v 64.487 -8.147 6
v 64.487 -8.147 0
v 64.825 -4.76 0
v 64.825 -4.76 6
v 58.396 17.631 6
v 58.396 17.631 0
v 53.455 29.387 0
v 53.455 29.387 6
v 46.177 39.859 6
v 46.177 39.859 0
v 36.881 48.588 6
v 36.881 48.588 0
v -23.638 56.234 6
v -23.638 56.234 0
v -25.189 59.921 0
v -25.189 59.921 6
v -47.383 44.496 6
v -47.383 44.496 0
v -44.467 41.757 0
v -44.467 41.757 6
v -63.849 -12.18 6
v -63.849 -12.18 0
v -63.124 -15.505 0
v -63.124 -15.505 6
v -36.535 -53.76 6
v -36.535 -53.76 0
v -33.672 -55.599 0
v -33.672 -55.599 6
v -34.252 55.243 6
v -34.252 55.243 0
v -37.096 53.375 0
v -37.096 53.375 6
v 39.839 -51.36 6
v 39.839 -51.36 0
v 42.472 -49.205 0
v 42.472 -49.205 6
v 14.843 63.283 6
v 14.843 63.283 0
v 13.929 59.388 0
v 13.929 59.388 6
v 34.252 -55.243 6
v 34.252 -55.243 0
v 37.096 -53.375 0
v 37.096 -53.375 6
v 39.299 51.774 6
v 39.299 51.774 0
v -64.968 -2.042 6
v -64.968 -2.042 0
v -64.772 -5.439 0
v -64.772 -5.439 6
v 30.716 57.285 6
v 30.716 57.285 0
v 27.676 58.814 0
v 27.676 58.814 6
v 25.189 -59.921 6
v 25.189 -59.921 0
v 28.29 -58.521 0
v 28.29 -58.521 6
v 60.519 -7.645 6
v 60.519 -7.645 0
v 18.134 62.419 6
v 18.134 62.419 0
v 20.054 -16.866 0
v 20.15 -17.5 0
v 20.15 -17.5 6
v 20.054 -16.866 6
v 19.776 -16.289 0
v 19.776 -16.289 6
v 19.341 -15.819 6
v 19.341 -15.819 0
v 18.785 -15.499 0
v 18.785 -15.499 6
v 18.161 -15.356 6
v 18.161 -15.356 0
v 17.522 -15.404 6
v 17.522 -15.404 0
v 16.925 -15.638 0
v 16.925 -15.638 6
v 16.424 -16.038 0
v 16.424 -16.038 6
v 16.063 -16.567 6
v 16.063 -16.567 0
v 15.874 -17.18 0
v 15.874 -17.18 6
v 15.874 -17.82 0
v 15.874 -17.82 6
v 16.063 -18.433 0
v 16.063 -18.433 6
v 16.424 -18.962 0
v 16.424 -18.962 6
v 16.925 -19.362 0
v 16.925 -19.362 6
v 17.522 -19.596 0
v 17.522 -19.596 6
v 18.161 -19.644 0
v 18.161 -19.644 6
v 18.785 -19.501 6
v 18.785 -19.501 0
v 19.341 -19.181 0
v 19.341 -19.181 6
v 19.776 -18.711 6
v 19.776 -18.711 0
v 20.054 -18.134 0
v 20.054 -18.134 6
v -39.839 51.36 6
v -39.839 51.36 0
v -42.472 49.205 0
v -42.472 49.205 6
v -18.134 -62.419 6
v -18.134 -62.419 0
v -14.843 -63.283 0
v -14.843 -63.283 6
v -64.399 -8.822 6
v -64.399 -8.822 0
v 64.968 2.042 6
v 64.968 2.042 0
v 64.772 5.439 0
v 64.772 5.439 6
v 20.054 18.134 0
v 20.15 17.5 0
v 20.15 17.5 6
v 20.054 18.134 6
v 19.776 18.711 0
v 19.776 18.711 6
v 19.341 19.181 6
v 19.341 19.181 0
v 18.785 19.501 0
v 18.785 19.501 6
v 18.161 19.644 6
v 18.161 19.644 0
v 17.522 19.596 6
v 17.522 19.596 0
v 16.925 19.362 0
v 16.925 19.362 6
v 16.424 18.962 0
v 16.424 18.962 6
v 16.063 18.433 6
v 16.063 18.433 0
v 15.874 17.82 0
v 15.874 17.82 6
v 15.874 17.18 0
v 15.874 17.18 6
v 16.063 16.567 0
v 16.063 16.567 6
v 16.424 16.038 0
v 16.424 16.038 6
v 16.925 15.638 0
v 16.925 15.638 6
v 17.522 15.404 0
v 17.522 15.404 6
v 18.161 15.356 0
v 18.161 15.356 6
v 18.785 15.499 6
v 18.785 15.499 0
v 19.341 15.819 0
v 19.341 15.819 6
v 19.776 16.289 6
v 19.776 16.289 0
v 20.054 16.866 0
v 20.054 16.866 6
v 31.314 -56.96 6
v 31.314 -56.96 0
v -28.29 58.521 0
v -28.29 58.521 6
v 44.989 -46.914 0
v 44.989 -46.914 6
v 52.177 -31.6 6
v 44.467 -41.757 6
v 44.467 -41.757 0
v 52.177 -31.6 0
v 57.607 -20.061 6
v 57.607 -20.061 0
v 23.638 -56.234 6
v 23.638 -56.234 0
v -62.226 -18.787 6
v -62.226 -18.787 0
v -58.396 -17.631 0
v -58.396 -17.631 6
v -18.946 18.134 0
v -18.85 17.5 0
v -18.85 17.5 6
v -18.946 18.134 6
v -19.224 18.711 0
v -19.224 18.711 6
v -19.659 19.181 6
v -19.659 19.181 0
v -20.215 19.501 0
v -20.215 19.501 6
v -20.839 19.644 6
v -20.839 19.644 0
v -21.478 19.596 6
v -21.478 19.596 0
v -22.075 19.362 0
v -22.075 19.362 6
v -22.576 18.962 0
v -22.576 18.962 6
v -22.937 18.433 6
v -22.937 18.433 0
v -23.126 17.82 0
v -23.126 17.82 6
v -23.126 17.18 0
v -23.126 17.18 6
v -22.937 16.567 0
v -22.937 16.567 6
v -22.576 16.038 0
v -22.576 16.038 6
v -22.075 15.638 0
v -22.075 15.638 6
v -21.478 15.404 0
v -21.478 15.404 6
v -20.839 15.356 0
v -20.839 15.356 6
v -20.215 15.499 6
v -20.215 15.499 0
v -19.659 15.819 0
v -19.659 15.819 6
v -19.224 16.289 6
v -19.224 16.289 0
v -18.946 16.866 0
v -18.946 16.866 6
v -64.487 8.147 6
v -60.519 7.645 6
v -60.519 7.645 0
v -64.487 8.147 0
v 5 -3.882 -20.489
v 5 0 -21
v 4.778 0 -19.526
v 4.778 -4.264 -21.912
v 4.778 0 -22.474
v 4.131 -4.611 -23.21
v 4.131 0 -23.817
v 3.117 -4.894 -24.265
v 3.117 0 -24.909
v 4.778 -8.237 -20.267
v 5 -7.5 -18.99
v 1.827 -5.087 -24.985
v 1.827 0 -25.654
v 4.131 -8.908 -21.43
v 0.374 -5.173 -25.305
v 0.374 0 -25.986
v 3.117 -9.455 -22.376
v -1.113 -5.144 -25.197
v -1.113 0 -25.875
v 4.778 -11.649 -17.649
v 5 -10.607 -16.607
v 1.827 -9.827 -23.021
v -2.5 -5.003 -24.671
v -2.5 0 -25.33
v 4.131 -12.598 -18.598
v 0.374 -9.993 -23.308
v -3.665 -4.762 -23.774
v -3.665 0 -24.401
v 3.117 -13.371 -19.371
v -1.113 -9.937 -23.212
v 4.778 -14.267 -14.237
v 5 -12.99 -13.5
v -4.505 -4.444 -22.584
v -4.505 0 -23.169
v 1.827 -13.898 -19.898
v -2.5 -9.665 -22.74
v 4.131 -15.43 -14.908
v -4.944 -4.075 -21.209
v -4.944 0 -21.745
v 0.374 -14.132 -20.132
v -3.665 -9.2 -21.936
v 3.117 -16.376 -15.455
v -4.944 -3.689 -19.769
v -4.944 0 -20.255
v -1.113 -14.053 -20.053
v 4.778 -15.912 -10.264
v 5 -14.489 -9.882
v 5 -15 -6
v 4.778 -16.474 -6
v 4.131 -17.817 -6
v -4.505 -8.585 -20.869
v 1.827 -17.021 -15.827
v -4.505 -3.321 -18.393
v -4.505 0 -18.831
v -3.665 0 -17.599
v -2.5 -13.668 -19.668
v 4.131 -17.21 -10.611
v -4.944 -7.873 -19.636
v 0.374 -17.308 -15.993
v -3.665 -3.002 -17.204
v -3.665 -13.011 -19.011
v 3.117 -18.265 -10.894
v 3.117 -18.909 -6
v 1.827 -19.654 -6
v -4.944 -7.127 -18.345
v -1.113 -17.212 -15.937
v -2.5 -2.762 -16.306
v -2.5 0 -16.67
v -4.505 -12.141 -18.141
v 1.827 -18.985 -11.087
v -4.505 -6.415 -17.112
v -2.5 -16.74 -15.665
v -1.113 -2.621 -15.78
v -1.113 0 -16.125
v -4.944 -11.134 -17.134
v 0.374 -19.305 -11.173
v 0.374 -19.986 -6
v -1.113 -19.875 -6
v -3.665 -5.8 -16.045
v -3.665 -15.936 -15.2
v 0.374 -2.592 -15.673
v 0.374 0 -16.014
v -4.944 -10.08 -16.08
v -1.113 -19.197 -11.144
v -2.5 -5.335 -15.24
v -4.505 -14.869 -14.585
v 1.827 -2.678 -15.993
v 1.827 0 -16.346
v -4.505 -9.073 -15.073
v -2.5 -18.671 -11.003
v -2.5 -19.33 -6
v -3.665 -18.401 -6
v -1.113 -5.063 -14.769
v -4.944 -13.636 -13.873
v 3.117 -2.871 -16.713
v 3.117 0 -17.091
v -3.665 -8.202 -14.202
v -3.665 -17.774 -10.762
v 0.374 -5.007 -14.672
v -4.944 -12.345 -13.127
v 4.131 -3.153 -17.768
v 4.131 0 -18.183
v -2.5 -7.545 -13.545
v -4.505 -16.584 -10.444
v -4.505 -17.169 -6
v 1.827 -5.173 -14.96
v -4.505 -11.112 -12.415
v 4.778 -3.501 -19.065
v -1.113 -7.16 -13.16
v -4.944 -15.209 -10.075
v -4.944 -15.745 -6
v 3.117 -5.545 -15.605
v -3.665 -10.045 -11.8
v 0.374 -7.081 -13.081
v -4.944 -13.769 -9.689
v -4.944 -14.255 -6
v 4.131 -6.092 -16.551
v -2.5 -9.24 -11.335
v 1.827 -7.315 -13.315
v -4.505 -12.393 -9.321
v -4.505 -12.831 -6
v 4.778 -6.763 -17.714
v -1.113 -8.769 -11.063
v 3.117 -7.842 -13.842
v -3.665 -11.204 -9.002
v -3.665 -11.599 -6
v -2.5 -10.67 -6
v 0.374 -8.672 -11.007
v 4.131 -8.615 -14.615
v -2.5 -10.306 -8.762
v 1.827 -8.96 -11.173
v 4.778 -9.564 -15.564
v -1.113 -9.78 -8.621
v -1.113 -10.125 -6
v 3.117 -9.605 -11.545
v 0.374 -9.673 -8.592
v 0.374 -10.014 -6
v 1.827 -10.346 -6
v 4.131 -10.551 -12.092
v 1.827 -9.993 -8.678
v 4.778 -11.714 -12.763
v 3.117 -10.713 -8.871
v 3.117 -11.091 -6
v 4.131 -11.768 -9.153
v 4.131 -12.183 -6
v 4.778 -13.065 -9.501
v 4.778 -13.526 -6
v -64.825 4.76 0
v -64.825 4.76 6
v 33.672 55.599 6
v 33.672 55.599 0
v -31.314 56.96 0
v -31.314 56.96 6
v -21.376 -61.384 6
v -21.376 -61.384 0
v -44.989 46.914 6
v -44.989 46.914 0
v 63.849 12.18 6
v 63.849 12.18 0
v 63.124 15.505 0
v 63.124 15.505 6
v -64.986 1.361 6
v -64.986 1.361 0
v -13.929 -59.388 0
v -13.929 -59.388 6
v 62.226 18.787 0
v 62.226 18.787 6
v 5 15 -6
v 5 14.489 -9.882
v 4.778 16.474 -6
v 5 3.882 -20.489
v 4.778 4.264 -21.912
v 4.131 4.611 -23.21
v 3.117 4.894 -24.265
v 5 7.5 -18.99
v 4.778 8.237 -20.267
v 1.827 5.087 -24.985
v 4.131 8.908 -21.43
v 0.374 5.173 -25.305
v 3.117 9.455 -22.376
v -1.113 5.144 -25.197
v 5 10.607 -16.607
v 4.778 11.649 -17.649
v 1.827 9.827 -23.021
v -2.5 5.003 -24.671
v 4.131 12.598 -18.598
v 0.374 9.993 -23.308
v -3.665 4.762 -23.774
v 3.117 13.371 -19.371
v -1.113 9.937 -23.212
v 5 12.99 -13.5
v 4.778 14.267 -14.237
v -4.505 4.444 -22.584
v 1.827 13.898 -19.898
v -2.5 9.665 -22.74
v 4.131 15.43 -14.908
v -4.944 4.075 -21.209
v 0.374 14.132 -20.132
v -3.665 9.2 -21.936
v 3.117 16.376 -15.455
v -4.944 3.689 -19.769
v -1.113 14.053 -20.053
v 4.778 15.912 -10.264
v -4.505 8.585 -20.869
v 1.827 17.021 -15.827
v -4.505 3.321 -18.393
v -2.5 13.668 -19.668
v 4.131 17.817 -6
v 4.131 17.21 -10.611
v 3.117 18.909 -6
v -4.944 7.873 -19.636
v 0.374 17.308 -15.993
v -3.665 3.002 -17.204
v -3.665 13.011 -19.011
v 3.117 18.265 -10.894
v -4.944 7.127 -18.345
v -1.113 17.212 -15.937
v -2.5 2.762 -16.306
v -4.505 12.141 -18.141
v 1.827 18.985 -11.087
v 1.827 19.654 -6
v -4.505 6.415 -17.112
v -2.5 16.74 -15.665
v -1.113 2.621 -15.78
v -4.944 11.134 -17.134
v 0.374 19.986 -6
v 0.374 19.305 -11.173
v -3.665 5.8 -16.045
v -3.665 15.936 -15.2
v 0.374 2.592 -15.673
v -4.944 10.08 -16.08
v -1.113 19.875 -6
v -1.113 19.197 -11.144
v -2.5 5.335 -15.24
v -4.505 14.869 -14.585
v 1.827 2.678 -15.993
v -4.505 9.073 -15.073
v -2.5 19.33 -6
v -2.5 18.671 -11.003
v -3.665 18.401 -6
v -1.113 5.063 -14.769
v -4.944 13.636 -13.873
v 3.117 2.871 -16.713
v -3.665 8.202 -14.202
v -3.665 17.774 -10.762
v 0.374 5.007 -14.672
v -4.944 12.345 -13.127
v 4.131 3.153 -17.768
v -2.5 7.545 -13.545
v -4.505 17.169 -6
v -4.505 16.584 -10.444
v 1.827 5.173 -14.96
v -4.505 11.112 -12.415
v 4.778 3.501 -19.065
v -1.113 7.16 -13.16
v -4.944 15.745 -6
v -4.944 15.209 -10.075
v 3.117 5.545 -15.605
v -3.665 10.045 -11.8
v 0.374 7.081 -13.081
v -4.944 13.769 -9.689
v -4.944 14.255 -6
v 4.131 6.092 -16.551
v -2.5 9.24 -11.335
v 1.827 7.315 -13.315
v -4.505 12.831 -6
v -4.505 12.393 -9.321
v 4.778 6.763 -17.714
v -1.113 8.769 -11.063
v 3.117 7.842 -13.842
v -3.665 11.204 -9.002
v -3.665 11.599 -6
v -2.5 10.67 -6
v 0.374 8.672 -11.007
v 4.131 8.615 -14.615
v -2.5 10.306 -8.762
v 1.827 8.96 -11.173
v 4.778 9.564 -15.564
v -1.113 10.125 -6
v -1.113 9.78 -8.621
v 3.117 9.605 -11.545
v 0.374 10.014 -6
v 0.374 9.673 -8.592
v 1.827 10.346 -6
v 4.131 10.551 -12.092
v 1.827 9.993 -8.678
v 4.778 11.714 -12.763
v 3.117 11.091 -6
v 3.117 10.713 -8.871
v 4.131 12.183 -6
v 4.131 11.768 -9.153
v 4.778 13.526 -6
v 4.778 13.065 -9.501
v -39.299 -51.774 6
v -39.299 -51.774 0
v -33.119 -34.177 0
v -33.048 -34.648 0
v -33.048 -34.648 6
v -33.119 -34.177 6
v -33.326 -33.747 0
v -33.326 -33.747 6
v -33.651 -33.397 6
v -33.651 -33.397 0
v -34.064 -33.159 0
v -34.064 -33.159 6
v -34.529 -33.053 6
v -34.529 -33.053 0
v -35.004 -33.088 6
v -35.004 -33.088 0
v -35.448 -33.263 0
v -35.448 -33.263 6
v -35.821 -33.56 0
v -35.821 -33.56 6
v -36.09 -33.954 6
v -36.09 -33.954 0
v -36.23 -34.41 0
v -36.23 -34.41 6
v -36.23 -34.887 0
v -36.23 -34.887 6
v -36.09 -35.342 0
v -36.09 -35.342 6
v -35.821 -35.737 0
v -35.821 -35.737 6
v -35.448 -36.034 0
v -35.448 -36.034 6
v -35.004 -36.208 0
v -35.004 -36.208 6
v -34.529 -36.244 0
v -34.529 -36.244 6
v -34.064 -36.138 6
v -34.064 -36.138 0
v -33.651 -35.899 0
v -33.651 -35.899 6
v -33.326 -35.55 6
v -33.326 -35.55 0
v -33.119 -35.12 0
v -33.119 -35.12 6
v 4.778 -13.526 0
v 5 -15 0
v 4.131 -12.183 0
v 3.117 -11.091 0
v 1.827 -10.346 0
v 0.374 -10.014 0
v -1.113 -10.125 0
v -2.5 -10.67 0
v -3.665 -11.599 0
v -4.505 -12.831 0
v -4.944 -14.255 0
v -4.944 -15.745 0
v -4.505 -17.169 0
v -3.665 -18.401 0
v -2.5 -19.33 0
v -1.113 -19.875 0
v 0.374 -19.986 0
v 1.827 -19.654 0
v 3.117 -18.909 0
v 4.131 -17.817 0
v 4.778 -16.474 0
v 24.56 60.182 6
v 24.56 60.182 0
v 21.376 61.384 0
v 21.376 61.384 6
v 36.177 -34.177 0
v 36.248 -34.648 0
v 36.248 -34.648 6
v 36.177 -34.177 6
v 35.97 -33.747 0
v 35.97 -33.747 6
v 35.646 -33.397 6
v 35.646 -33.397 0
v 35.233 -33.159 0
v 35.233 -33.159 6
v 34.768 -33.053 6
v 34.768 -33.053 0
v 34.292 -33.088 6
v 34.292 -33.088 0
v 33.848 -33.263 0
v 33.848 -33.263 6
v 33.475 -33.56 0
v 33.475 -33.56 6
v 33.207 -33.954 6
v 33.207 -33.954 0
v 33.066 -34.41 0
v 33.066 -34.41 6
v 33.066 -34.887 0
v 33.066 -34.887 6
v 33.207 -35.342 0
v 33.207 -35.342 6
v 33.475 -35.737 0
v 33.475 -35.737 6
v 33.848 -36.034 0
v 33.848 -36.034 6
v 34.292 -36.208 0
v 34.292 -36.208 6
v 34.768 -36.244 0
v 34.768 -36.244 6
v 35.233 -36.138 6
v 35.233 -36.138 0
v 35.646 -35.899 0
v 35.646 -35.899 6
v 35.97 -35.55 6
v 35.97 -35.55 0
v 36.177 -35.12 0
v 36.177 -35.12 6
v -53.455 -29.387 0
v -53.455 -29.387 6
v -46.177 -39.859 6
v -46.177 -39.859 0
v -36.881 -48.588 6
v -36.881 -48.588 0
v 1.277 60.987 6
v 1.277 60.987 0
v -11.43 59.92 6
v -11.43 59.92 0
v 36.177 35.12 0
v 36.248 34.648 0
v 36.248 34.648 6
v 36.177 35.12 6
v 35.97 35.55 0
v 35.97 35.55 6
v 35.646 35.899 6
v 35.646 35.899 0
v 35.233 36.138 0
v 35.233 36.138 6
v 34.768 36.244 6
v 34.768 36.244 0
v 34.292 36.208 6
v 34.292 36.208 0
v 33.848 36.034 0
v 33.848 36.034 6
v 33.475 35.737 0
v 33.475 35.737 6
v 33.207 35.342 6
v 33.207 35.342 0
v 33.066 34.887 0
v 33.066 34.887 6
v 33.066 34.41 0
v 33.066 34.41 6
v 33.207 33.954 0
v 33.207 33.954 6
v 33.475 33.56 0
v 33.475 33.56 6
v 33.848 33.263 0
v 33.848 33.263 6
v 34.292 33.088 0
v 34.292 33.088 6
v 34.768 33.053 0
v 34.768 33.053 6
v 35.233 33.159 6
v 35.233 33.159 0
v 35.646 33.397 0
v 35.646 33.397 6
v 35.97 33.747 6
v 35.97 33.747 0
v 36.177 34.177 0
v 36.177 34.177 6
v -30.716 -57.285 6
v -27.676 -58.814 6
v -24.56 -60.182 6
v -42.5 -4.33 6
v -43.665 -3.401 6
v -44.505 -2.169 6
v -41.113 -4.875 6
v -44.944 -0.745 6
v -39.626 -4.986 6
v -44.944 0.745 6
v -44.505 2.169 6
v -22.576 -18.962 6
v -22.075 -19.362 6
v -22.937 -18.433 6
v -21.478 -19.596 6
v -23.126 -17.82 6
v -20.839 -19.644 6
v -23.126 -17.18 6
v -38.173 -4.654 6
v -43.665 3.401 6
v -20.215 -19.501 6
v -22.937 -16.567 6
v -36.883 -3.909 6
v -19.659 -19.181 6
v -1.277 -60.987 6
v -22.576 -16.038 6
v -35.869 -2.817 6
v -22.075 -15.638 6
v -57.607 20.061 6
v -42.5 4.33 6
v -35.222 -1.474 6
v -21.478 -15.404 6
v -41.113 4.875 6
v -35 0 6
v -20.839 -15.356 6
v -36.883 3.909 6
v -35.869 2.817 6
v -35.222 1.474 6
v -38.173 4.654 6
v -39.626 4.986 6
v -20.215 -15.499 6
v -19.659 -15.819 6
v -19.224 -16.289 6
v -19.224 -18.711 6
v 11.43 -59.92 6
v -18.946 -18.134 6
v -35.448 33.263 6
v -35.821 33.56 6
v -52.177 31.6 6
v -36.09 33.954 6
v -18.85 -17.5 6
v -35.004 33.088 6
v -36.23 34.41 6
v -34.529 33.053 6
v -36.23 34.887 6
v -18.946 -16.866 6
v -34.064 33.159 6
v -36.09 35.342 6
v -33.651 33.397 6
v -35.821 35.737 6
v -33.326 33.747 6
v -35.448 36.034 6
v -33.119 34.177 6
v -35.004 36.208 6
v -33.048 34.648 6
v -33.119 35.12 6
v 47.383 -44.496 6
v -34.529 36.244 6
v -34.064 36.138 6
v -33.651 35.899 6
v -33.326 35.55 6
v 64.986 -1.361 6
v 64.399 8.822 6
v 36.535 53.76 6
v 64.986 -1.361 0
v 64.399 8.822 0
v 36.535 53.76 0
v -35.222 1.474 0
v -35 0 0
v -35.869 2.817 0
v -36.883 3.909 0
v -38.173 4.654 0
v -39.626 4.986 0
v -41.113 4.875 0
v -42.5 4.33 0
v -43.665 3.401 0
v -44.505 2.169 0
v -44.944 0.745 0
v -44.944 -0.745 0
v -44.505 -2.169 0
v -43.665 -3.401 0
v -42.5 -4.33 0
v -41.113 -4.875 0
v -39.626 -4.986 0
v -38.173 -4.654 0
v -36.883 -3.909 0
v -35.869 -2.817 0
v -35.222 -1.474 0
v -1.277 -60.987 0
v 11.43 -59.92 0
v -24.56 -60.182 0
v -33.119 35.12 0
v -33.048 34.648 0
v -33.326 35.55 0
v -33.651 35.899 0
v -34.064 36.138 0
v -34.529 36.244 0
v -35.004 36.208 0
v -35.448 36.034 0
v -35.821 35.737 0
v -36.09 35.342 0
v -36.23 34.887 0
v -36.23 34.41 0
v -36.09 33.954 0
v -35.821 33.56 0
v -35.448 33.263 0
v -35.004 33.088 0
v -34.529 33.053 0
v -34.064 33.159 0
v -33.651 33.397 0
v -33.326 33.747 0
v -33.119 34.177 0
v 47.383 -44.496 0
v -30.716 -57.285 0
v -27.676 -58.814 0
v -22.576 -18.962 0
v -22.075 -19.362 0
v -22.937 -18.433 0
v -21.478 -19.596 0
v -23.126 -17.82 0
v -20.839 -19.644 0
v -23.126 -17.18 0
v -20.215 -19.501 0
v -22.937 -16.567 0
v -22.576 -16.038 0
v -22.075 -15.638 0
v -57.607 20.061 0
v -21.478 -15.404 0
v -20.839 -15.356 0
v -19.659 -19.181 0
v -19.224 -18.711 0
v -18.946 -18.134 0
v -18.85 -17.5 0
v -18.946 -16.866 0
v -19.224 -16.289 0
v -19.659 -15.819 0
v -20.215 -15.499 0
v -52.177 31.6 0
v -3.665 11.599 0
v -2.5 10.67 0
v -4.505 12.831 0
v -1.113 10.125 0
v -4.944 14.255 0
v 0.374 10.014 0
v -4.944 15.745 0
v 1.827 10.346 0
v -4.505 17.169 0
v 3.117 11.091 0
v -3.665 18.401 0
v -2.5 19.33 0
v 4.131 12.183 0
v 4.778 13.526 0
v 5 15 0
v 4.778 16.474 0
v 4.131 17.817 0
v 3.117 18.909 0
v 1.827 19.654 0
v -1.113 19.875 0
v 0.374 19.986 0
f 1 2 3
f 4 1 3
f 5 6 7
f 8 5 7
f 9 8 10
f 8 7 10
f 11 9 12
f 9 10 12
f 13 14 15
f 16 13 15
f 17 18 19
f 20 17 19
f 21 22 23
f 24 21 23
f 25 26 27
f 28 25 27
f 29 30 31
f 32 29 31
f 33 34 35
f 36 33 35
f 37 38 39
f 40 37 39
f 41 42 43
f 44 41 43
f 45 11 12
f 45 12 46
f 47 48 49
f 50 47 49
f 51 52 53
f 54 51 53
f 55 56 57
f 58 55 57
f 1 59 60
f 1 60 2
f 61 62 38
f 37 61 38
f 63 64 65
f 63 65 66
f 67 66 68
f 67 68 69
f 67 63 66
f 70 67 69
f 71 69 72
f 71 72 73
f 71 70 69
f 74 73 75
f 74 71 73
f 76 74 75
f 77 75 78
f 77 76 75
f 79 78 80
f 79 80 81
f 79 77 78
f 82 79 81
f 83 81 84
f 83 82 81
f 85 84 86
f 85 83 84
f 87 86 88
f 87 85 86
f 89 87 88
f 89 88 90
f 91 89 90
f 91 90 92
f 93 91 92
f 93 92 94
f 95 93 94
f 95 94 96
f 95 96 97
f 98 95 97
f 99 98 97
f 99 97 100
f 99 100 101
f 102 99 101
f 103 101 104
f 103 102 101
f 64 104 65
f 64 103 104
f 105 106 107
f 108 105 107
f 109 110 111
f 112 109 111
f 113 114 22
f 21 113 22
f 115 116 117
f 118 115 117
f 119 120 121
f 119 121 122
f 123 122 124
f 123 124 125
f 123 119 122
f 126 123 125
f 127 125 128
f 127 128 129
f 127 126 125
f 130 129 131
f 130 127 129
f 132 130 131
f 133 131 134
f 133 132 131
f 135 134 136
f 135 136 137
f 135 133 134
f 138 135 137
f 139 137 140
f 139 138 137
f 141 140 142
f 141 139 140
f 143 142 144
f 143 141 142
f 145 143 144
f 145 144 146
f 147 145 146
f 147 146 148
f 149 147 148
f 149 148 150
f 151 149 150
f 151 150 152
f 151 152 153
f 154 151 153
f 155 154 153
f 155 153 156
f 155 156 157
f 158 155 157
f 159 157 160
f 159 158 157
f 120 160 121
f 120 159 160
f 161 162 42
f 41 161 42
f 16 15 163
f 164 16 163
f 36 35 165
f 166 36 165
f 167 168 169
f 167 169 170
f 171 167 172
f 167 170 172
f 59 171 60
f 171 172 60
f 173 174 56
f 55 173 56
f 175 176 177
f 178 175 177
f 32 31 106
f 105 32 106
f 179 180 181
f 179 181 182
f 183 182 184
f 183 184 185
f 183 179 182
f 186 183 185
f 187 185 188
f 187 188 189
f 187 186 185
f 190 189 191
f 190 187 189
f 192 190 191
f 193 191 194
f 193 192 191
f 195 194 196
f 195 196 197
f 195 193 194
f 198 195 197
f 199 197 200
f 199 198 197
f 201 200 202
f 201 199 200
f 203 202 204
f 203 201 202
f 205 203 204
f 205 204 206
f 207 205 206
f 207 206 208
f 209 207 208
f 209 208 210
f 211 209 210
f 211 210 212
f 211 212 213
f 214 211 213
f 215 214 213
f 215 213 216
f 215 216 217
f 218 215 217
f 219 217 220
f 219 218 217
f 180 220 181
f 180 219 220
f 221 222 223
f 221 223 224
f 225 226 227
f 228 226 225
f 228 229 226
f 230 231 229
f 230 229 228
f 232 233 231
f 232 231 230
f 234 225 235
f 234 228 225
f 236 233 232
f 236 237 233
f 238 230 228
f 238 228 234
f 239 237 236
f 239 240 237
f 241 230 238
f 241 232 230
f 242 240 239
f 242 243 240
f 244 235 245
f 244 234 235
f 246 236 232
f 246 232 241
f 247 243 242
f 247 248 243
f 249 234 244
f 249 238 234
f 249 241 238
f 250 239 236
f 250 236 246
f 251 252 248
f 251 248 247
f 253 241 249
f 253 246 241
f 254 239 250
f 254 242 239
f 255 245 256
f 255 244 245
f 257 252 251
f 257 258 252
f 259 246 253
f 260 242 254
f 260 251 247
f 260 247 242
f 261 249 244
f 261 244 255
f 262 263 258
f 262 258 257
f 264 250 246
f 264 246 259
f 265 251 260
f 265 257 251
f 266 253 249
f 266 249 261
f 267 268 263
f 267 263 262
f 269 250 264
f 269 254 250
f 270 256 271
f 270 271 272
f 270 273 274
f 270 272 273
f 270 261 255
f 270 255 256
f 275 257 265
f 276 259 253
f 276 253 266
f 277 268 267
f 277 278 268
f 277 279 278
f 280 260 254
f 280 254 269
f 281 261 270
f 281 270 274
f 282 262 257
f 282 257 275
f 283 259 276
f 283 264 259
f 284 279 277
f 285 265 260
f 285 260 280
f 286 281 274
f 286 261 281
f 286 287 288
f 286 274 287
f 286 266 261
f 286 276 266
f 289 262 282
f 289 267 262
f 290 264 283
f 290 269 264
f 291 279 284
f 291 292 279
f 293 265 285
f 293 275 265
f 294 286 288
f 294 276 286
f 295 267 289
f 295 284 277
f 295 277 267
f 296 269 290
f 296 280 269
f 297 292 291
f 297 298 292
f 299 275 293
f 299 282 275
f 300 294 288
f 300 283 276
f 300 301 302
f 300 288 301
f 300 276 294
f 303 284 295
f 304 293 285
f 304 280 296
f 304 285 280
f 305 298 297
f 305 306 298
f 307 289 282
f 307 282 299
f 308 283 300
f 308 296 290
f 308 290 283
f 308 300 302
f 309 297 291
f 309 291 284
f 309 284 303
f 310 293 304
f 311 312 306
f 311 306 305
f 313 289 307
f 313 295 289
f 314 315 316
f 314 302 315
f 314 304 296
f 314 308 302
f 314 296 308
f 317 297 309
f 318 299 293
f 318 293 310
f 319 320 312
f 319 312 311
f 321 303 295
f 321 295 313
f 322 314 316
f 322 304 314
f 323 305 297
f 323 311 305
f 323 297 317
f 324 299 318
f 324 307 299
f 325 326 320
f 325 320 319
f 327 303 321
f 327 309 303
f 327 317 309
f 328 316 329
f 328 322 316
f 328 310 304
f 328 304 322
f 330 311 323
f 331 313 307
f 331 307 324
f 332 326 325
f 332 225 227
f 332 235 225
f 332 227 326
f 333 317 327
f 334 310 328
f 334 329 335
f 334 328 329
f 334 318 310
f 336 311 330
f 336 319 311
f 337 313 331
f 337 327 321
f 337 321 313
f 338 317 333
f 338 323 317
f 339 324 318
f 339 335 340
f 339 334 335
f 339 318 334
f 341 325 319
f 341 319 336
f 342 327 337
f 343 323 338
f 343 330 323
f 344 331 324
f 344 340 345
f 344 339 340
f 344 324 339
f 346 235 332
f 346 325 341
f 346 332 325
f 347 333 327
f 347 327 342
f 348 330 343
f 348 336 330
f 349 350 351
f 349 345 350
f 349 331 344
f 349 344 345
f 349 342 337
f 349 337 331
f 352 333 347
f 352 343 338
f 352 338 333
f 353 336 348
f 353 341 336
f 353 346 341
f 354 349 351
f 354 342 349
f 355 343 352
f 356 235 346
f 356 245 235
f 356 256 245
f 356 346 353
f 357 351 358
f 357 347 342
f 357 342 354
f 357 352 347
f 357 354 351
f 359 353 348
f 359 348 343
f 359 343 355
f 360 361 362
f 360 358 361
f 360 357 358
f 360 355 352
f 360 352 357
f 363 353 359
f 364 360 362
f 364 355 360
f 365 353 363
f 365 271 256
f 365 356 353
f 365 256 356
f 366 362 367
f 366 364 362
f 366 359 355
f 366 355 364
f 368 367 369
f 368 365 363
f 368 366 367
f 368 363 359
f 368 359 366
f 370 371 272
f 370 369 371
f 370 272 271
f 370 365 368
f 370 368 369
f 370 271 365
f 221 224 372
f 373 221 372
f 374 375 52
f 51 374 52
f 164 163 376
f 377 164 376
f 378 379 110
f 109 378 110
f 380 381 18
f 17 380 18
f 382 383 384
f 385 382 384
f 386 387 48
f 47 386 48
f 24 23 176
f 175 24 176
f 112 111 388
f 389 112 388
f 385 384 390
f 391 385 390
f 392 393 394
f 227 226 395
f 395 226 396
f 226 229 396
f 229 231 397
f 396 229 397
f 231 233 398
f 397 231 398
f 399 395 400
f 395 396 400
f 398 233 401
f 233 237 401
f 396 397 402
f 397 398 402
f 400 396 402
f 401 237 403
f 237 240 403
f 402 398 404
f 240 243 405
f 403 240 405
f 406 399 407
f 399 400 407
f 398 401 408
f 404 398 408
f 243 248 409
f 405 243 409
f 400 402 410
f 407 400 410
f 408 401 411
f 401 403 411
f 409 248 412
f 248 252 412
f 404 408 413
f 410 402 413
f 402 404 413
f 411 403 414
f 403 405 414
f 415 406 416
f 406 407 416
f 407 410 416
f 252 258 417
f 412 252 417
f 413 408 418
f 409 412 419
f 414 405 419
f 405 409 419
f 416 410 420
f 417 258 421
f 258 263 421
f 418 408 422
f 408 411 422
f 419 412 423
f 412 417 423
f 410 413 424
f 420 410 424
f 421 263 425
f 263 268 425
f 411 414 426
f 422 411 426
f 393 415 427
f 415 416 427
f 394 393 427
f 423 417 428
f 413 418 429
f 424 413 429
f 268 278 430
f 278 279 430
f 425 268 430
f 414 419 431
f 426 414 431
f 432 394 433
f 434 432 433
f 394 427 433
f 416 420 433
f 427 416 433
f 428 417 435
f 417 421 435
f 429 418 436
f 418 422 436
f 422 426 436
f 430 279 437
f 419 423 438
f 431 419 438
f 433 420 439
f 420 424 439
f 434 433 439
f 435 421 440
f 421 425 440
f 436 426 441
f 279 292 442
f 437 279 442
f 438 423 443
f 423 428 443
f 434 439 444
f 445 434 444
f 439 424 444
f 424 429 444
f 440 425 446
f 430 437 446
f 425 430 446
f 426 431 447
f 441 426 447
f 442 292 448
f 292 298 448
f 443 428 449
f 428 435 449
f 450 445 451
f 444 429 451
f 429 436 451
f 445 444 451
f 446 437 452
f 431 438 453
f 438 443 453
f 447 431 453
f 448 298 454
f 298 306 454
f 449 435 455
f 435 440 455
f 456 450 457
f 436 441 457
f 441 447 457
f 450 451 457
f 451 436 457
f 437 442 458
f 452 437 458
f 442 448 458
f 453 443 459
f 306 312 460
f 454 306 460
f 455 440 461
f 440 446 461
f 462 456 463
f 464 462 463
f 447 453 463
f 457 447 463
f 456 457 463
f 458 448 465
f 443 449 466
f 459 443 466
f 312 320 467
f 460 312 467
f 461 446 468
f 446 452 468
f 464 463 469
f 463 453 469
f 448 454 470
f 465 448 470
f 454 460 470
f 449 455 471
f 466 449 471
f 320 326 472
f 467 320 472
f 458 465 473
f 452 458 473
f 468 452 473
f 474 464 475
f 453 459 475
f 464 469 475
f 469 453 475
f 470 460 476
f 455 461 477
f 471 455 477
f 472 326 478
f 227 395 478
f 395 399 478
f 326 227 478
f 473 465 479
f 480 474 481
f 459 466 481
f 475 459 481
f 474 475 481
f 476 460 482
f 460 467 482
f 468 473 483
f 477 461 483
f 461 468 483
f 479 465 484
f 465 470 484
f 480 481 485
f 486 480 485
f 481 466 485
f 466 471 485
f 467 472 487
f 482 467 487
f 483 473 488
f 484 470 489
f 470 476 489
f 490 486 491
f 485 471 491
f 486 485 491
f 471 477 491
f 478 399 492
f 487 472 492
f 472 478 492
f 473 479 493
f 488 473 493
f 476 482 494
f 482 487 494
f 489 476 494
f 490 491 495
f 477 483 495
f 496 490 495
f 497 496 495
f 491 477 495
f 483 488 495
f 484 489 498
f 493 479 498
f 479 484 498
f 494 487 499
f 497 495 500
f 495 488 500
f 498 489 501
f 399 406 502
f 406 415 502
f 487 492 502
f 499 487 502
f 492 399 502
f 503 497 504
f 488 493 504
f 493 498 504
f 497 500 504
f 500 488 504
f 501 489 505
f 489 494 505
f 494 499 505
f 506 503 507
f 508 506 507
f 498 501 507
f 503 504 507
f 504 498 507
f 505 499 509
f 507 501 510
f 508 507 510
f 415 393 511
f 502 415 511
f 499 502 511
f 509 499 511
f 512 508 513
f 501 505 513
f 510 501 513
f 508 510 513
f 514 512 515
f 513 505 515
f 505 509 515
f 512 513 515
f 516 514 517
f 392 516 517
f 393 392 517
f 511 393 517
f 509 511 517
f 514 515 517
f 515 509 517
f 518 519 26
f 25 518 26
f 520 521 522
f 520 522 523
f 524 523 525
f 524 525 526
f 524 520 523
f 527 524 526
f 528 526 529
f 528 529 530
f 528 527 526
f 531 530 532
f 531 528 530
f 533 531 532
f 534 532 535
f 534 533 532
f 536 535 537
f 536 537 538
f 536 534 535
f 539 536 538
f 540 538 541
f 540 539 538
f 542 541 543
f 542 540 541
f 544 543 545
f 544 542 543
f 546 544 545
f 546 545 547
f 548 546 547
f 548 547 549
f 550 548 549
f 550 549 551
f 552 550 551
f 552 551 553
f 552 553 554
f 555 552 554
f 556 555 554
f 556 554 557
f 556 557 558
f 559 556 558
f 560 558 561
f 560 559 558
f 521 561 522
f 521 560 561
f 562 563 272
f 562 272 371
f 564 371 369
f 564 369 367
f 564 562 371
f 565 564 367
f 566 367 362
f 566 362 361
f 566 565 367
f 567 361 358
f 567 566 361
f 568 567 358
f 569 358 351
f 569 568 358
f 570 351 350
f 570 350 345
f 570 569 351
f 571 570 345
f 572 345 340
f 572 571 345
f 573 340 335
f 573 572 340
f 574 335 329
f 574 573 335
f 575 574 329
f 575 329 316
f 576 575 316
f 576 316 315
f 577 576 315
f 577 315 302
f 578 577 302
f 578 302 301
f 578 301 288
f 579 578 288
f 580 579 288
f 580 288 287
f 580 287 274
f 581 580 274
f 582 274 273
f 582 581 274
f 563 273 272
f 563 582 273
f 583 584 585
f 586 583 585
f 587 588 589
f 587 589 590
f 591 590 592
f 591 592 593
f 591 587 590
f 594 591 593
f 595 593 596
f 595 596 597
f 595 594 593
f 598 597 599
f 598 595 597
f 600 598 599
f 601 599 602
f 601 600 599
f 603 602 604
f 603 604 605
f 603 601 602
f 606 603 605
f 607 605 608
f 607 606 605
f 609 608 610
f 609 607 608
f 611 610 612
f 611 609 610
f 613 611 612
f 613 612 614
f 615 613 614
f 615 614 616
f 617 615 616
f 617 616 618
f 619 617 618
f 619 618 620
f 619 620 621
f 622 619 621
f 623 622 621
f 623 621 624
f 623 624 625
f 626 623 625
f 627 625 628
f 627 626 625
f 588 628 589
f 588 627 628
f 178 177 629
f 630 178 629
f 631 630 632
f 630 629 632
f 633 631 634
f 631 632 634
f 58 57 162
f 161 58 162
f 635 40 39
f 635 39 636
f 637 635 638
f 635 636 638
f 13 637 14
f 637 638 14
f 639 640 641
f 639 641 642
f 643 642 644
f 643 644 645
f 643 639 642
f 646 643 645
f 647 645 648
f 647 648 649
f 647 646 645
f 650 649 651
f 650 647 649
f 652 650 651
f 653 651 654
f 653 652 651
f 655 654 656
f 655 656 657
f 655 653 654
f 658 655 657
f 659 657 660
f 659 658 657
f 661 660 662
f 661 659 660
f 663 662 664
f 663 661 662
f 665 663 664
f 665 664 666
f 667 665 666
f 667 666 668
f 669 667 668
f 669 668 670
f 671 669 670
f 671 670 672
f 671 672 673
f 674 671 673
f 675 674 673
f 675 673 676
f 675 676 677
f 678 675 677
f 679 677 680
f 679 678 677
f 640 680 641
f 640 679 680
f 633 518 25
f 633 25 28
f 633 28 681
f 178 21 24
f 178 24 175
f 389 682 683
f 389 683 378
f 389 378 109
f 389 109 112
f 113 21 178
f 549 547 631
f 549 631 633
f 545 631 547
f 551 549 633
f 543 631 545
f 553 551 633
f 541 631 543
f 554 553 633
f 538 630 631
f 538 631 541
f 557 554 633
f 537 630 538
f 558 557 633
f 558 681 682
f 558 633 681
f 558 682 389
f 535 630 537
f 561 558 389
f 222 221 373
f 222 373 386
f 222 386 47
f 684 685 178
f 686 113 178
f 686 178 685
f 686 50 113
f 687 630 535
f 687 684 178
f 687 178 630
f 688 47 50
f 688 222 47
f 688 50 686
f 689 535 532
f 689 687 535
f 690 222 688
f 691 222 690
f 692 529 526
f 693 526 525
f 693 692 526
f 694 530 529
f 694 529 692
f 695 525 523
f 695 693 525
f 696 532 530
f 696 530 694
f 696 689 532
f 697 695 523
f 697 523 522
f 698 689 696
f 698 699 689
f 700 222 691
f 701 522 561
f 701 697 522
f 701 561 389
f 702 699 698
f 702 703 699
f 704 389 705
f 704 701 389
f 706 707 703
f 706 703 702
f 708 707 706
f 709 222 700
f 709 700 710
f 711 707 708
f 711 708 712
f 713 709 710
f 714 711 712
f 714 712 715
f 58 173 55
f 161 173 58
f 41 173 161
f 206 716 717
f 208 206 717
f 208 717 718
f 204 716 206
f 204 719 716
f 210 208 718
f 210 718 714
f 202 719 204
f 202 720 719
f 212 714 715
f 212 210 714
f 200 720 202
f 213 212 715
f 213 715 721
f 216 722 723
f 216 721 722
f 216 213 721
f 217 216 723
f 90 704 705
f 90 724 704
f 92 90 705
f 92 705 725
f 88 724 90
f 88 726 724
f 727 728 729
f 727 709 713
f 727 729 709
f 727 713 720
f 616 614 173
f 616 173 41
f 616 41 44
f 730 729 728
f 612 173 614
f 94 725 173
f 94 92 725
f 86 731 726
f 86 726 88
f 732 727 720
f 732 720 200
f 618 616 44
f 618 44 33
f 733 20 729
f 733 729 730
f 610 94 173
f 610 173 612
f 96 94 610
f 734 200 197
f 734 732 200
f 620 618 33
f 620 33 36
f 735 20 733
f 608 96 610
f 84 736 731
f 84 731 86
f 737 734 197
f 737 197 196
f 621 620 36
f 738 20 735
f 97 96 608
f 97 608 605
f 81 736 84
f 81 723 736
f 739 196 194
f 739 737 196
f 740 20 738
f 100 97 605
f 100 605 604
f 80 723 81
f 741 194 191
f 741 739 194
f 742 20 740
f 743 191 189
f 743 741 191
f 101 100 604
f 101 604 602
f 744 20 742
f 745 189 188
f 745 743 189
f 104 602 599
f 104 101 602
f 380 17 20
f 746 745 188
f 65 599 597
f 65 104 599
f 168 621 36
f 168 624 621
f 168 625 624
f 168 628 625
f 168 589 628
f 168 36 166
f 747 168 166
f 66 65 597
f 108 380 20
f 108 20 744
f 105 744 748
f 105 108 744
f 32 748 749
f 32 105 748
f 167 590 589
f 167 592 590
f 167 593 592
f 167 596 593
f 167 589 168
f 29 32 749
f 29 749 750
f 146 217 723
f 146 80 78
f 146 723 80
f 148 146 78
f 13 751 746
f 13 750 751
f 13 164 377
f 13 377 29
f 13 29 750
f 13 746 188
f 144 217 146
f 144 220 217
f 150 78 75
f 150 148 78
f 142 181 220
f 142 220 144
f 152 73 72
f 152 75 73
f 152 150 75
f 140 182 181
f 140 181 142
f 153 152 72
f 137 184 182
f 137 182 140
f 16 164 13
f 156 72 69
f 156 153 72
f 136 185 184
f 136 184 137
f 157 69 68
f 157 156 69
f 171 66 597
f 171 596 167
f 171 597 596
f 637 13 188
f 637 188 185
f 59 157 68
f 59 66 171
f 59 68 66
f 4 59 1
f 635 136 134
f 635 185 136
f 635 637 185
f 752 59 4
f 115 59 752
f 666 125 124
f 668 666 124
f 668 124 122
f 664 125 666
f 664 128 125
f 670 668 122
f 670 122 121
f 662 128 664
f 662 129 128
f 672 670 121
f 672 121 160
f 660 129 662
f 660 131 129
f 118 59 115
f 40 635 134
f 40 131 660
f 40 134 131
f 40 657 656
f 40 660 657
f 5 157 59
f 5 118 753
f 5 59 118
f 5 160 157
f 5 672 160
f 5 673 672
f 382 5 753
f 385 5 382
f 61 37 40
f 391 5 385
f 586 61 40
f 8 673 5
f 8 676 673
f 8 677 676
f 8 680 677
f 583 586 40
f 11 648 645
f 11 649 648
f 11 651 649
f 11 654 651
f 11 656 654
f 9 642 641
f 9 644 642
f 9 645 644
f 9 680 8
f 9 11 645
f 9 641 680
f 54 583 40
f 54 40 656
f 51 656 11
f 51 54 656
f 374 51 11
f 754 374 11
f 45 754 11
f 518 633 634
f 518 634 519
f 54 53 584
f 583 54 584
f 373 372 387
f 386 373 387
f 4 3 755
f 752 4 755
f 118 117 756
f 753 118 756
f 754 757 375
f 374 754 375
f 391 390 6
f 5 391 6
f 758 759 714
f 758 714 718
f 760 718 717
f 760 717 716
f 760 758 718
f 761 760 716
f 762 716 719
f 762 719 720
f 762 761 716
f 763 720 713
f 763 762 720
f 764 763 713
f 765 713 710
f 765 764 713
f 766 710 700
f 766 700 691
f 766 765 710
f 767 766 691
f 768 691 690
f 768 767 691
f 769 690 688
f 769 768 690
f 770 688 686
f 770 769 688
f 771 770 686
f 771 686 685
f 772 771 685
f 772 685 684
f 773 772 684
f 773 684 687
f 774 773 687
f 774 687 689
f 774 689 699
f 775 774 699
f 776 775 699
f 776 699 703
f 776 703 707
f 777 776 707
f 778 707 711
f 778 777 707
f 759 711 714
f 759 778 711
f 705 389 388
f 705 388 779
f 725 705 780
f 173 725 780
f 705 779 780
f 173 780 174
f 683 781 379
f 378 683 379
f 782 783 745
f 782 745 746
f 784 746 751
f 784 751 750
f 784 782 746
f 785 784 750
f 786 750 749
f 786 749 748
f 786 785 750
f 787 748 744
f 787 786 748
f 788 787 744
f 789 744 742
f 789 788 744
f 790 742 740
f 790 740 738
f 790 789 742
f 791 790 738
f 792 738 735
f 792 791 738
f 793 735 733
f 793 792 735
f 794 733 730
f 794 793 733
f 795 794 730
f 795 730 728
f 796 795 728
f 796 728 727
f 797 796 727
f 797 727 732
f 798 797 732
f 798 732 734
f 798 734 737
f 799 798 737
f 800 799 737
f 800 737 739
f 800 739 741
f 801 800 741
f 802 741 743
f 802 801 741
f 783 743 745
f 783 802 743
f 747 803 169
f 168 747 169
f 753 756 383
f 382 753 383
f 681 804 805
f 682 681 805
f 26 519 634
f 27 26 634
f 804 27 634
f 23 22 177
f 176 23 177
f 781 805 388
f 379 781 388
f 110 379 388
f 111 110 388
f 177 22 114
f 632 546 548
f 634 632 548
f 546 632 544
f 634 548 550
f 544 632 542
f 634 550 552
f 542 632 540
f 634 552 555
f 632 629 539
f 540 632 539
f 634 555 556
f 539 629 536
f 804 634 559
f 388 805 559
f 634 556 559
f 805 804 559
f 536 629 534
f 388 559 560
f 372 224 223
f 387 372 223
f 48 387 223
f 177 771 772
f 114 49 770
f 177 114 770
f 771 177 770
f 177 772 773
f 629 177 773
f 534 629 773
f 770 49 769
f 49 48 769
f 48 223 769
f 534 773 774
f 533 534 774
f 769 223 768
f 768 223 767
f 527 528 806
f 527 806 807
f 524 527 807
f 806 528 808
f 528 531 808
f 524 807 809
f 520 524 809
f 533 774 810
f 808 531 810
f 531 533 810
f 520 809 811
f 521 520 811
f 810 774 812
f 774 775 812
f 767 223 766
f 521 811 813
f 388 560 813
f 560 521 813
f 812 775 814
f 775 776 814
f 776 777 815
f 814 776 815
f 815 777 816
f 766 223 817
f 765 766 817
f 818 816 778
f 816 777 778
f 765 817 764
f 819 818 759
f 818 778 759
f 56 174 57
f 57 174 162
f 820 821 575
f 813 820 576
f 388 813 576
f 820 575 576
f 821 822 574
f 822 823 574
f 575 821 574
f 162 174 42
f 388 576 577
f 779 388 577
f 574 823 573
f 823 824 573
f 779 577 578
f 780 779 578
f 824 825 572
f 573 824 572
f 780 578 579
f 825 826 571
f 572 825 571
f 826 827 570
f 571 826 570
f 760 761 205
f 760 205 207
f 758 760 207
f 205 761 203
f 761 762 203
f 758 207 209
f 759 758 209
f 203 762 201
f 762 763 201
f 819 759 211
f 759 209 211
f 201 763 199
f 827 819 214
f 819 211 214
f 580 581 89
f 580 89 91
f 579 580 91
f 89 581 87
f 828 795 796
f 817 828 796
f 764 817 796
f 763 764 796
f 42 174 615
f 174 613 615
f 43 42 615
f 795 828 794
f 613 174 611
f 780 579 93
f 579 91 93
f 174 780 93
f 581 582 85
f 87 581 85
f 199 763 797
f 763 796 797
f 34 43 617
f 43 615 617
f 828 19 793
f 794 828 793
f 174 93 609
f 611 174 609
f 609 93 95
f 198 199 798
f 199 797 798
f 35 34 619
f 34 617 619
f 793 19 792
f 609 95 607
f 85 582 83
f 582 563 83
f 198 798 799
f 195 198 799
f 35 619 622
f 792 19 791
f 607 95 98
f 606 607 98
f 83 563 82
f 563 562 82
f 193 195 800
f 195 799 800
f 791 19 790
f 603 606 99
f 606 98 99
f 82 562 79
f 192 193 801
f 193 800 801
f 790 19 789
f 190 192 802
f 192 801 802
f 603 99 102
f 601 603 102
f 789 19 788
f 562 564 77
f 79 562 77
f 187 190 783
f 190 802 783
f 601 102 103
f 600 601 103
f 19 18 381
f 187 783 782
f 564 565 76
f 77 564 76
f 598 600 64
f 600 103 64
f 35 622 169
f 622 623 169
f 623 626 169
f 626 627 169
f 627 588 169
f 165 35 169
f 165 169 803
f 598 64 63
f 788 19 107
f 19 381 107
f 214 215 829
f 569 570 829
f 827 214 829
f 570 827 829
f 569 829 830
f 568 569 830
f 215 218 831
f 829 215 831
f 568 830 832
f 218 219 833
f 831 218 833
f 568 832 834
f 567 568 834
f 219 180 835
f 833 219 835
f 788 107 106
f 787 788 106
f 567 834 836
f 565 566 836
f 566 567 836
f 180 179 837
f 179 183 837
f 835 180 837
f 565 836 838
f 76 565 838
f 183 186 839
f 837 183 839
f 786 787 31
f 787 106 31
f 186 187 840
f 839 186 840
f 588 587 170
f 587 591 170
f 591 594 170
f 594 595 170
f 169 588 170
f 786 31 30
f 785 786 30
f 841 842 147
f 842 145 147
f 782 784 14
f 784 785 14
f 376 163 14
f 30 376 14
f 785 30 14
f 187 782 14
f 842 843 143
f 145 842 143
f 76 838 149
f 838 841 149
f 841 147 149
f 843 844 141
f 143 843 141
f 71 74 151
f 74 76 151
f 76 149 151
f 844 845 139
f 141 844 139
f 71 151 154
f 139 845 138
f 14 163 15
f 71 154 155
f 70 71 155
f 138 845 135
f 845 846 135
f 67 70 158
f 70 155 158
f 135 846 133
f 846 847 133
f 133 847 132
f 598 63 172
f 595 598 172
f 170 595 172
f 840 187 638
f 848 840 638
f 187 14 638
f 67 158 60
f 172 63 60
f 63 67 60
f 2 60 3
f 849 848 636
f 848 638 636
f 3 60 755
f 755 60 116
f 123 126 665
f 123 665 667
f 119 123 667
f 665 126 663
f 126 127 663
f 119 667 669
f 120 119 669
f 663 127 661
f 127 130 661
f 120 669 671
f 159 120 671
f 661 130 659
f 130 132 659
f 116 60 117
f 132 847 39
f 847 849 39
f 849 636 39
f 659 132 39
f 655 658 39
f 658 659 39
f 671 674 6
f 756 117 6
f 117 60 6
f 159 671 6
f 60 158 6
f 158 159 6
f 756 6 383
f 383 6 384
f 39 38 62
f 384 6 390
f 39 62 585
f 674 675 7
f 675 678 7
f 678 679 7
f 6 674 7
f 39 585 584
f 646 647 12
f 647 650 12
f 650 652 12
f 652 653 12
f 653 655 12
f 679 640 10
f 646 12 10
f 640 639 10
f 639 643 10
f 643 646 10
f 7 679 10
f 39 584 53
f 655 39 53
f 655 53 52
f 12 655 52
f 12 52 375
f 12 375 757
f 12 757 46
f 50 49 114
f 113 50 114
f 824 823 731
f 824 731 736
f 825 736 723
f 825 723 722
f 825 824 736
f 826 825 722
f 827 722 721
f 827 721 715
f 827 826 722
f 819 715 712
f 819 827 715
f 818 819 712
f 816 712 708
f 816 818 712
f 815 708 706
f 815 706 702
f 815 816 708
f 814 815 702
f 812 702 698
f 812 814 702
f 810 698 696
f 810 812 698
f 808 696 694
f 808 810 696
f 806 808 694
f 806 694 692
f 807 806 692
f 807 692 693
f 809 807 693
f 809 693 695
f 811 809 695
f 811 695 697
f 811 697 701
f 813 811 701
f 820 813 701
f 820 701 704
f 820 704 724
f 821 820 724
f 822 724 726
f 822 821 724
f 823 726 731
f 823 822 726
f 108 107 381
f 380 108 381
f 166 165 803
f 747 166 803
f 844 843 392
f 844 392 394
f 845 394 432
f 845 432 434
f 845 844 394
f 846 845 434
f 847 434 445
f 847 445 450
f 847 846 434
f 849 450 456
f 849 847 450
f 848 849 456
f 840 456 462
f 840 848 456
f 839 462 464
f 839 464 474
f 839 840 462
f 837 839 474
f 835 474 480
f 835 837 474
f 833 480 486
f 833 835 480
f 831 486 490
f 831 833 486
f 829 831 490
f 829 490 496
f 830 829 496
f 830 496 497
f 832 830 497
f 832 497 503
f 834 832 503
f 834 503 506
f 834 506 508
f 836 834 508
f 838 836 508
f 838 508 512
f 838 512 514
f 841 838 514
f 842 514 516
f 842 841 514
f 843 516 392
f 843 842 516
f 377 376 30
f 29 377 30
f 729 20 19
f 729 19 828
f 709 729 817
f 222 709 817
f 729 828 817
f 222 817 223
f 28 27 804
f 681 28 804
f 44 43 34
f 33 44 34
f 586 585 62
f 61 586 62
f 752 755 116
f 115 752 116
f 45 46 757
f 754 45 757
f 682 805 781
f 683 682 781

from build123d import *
from build123d.topology import SkipClean

# Parameters (mm, degrees)
SKETCH_1_R                = 61
SKETCH_1_R_2              = 1.6
SKETCH_1_R_3              = 2.15
SKETCH_1_R_4              = 5
EXTRUDE_1_DEPTH           = 6
EXTRUDE_2_DEPTH           = 6
SKETCH_3_R                = 5
EXTRUDE_3_DEPTH           = 6
SKETCH_4_R                = 5
REVOLVE_1_ANGLE           = 90
REVOLVE_1_OTHER_WAY_ANGLE = 90


with BuildPart() as part:
    # 草圖1 → 填料-伸長1 (new body)
    with BuildSketch(Plane.XY):
        Circle(SKETCH_1_R)
        with Locations((34.648232278, 34.648232278)):
            Circle(SKETCH_1_R_2, mode=Mode.SUBTRACT)
        with Locations((-34.648232278, 34.648232278)):
            Circle(SKETCH_1_R_2, mode=Mode.SUBTRACT)
        with Locations((-34.648232278, -34.648232278)):
            Circle(SKETCH_1_R_2, mode=Mode.SUBTRACT)
        with Locations((34.648232278, -34.648232278)):
            Circle(SKETCH_1_R_2, mode=Mode.SUBTRACT)
        with Locations((-21, 17.5)):
            Circle(SKETCH_1_R_3, mode=Mode.SUBTRACT)
        with Locations((-21, -17.5)):
            Circle(SKETCH_1_R_3, mode=Mode.SUBTRACT)
        with Locations((18, 17.5)):
            Circle(SKETCH_1_R_3, mode=Mode.SUBTRACT)
        with Locations((18, -17.5)):
            Circle(SKETCH_1_R_3, mode=Mode.SUBTRACT)
        with Locations((-40, 0)):
            Circle(SKETCH_1_R_4, mode=Mode.SUBTRACT)
    extrude(amount=EXTRUDE_1_DEPTH)

    # 草圖2 → 填料-伸長2 (add)
    with BuildSketch(Plane.XY):
        Polygon((64.487455585, -8.146660182), (64.82544102, -4.760482813), (64.985744426, -1.361257292), (64.967926424, 2.04169934), (64.772035851, 5.439059817), (64.398609631, 8.821512208), (63.848671297, 12.179785448), (63.123728194, 15.504674743), (62.22576734, 18.787066801), (57.917829601, 17.486423715), (58.753623935, 14.431274184), (59.428378669, 11.336569532), (59.940244349, 8.210792132), (60.287817985, 5.062509522), (60.470146902, 1.900350924), (60.48673135, -1.267016403), (60.337525872, -4.430910926), (60.02293943, -7.582660631), align=None)
        Polygon((39.298942466, 51.774444672), (36.53541956, 53.760237328), (33.671755609, 55.59867691), (30.715799716, 57.284724384), (27.675653952, 58.81375841), (24.559651143, 60.181588013), (21.376332038, 61.384464065), (18.134421893, 62.419089569), (14.842806557, 63.282628687), (13.815227642, 58.901523624), (16.878961915, 58.097767983), (19.896432128, 57.134770399), (22.859367603, 56.015170381), (25.75964714, 54.742036674), (28.589321275, 53.31885885), (31.340634067, 51.74953774), (34.00604436, 50.038374744), (36.578246449, 48.19006004), align=None)
        Polygon((-25.188513119, 59.921104853), (-28.290021459, 58.520720141), (-31.313988817, 56.959934203), (-34.252126707, 55.243025044), (-37.096381899, 53.374698594), (-39.838958487, 51.360075804), (-42.472339259, 49.204678617), (-44.989306302, 46.914414826), (-47.382960782, 44.495561885), (-44.102601959, 41.415099909), (-41.874662019, 43.6664938), (-39.531946541, 45.798200867), (-37.080876746, 47.804378249), (-34.528170845, 49.679527153), (-31.880825628, 51.418507926), (-29.146097283, 53.016554143), (-26.331481512, 54.46928567), (-23.44469298, 55.772720671), align=None)
        Polygon((-64.487455585, 8.146660182), (-64.82544102, 4.760482813), (-64.985744426, 1.361257292), (-64.967926424, -2.04169934), (-64.772035851, -5.439059817), (-64.398609631, -8.821512208), (-63.848671297, -12.179785448), (-63.123728194, -15.504674743), (-62.22576734, -18.787066801), (-57.917829601, -17.486423715), (-58.753623935, -14.431274184), (-59.428378669, -11.336569532), (-59.940244349, -8.210792132), (-60.287817985, -5.062509522), (-60.470146902, -1.900350924), (-60.48673135, 1.267016403), (-60.337525872, 4.430910926), (-60.02293943, 7.582660631), align=None)
        Polygon((-39.298942466, -51.774444672), (-36.53541956, -53.760237328), (-33.671755609, -55.59867691), (-30.715799716, -57.284724384), (-27.675653952, -58.81375841), (-24.559651143, -60.181588013), (-21.376332038, -61.384464065), (-18.134421893, -62.419089569), (-14.842806557, -63.282628687), (-13.815227642, -58.901523624), (-16.878961915, -58.097767983), (-19.896432128, -57.134770399), (-22.859367603, -56.015170381), (-25.75964714, -54.742036674), (-28.589321275, -53.31885885), (-31.340634067, -51.74953774), (-34.00604436, -50.038374744), (-36.578246449, -48.19006004), align=None)
        Polygon((25.188513119, -59.921104853), (28.290021459, -58.520720141), (31.313988817, -56.959934203), (34.252126707, -55.243025044), (37.096381899, -53.374698594), (39.838958487, -51.360075804), (42.472339259, -49.204678617), (44.989306302, -46.914414826), (47.382960782, -44.495561885), (44.102601959, -41.415099909), (41.874662019, -43.6664938), (39.531946541, -45.798200867), (37.080876746, -47.804378249), (34.528170845, -49.679527153), (31.880825628, -51.418507926), (29.146097283, -53.016554143), (26.331481512, -54.46928567), (23.44469298, -55.772720671), align=None)
    extrude(amount=EXTRUDE_2_DEPTH)

    # 草圖3 → 填料-伸長3 (add)
    with BuildSketch(Plane.XY):
        with Locations((0, 15)):
            Circle(SKETCH_3_R)
        with Locations((0, -15)):
            Circle(SKETCH_3_R)
    extrude(amount=-EXTRUDE_3_DEPTH)

    # 草圖4 → 旋轉1 (revolve)
    with BuildSketch(Plane(origin=(0, 0, 0), x_dir=(1, 0, 0), z_dir=(0, 1, 0))):
        with Locations((0, 21)):
            Circle(SKETCH_4_R)
    revolve(axis=Axis((-20, 0, -6), (1, 0, 0)), revolution_arc=REVOLVE_1_ANGLE)

    # 草圖4 → 旋轉1 other way (revolve)
    with SkipClean():  # the faces are left unmerged after this step: merging them gives an invalid solid
        with BuildSketch(Plane(origin=(0, 0, 0), x_dir=(1, 0, 0), z_dir=(0, 1, 0))):
            with Locations((0, 21)):
                Circle(SKETCH_4_R)
        revolve(axis=Axis((-20, 0, -6), (-1, 0, 0)), revolution_arc=REVOLVE_1_OTHER_WAY_ANGLE)


solid = part.part
